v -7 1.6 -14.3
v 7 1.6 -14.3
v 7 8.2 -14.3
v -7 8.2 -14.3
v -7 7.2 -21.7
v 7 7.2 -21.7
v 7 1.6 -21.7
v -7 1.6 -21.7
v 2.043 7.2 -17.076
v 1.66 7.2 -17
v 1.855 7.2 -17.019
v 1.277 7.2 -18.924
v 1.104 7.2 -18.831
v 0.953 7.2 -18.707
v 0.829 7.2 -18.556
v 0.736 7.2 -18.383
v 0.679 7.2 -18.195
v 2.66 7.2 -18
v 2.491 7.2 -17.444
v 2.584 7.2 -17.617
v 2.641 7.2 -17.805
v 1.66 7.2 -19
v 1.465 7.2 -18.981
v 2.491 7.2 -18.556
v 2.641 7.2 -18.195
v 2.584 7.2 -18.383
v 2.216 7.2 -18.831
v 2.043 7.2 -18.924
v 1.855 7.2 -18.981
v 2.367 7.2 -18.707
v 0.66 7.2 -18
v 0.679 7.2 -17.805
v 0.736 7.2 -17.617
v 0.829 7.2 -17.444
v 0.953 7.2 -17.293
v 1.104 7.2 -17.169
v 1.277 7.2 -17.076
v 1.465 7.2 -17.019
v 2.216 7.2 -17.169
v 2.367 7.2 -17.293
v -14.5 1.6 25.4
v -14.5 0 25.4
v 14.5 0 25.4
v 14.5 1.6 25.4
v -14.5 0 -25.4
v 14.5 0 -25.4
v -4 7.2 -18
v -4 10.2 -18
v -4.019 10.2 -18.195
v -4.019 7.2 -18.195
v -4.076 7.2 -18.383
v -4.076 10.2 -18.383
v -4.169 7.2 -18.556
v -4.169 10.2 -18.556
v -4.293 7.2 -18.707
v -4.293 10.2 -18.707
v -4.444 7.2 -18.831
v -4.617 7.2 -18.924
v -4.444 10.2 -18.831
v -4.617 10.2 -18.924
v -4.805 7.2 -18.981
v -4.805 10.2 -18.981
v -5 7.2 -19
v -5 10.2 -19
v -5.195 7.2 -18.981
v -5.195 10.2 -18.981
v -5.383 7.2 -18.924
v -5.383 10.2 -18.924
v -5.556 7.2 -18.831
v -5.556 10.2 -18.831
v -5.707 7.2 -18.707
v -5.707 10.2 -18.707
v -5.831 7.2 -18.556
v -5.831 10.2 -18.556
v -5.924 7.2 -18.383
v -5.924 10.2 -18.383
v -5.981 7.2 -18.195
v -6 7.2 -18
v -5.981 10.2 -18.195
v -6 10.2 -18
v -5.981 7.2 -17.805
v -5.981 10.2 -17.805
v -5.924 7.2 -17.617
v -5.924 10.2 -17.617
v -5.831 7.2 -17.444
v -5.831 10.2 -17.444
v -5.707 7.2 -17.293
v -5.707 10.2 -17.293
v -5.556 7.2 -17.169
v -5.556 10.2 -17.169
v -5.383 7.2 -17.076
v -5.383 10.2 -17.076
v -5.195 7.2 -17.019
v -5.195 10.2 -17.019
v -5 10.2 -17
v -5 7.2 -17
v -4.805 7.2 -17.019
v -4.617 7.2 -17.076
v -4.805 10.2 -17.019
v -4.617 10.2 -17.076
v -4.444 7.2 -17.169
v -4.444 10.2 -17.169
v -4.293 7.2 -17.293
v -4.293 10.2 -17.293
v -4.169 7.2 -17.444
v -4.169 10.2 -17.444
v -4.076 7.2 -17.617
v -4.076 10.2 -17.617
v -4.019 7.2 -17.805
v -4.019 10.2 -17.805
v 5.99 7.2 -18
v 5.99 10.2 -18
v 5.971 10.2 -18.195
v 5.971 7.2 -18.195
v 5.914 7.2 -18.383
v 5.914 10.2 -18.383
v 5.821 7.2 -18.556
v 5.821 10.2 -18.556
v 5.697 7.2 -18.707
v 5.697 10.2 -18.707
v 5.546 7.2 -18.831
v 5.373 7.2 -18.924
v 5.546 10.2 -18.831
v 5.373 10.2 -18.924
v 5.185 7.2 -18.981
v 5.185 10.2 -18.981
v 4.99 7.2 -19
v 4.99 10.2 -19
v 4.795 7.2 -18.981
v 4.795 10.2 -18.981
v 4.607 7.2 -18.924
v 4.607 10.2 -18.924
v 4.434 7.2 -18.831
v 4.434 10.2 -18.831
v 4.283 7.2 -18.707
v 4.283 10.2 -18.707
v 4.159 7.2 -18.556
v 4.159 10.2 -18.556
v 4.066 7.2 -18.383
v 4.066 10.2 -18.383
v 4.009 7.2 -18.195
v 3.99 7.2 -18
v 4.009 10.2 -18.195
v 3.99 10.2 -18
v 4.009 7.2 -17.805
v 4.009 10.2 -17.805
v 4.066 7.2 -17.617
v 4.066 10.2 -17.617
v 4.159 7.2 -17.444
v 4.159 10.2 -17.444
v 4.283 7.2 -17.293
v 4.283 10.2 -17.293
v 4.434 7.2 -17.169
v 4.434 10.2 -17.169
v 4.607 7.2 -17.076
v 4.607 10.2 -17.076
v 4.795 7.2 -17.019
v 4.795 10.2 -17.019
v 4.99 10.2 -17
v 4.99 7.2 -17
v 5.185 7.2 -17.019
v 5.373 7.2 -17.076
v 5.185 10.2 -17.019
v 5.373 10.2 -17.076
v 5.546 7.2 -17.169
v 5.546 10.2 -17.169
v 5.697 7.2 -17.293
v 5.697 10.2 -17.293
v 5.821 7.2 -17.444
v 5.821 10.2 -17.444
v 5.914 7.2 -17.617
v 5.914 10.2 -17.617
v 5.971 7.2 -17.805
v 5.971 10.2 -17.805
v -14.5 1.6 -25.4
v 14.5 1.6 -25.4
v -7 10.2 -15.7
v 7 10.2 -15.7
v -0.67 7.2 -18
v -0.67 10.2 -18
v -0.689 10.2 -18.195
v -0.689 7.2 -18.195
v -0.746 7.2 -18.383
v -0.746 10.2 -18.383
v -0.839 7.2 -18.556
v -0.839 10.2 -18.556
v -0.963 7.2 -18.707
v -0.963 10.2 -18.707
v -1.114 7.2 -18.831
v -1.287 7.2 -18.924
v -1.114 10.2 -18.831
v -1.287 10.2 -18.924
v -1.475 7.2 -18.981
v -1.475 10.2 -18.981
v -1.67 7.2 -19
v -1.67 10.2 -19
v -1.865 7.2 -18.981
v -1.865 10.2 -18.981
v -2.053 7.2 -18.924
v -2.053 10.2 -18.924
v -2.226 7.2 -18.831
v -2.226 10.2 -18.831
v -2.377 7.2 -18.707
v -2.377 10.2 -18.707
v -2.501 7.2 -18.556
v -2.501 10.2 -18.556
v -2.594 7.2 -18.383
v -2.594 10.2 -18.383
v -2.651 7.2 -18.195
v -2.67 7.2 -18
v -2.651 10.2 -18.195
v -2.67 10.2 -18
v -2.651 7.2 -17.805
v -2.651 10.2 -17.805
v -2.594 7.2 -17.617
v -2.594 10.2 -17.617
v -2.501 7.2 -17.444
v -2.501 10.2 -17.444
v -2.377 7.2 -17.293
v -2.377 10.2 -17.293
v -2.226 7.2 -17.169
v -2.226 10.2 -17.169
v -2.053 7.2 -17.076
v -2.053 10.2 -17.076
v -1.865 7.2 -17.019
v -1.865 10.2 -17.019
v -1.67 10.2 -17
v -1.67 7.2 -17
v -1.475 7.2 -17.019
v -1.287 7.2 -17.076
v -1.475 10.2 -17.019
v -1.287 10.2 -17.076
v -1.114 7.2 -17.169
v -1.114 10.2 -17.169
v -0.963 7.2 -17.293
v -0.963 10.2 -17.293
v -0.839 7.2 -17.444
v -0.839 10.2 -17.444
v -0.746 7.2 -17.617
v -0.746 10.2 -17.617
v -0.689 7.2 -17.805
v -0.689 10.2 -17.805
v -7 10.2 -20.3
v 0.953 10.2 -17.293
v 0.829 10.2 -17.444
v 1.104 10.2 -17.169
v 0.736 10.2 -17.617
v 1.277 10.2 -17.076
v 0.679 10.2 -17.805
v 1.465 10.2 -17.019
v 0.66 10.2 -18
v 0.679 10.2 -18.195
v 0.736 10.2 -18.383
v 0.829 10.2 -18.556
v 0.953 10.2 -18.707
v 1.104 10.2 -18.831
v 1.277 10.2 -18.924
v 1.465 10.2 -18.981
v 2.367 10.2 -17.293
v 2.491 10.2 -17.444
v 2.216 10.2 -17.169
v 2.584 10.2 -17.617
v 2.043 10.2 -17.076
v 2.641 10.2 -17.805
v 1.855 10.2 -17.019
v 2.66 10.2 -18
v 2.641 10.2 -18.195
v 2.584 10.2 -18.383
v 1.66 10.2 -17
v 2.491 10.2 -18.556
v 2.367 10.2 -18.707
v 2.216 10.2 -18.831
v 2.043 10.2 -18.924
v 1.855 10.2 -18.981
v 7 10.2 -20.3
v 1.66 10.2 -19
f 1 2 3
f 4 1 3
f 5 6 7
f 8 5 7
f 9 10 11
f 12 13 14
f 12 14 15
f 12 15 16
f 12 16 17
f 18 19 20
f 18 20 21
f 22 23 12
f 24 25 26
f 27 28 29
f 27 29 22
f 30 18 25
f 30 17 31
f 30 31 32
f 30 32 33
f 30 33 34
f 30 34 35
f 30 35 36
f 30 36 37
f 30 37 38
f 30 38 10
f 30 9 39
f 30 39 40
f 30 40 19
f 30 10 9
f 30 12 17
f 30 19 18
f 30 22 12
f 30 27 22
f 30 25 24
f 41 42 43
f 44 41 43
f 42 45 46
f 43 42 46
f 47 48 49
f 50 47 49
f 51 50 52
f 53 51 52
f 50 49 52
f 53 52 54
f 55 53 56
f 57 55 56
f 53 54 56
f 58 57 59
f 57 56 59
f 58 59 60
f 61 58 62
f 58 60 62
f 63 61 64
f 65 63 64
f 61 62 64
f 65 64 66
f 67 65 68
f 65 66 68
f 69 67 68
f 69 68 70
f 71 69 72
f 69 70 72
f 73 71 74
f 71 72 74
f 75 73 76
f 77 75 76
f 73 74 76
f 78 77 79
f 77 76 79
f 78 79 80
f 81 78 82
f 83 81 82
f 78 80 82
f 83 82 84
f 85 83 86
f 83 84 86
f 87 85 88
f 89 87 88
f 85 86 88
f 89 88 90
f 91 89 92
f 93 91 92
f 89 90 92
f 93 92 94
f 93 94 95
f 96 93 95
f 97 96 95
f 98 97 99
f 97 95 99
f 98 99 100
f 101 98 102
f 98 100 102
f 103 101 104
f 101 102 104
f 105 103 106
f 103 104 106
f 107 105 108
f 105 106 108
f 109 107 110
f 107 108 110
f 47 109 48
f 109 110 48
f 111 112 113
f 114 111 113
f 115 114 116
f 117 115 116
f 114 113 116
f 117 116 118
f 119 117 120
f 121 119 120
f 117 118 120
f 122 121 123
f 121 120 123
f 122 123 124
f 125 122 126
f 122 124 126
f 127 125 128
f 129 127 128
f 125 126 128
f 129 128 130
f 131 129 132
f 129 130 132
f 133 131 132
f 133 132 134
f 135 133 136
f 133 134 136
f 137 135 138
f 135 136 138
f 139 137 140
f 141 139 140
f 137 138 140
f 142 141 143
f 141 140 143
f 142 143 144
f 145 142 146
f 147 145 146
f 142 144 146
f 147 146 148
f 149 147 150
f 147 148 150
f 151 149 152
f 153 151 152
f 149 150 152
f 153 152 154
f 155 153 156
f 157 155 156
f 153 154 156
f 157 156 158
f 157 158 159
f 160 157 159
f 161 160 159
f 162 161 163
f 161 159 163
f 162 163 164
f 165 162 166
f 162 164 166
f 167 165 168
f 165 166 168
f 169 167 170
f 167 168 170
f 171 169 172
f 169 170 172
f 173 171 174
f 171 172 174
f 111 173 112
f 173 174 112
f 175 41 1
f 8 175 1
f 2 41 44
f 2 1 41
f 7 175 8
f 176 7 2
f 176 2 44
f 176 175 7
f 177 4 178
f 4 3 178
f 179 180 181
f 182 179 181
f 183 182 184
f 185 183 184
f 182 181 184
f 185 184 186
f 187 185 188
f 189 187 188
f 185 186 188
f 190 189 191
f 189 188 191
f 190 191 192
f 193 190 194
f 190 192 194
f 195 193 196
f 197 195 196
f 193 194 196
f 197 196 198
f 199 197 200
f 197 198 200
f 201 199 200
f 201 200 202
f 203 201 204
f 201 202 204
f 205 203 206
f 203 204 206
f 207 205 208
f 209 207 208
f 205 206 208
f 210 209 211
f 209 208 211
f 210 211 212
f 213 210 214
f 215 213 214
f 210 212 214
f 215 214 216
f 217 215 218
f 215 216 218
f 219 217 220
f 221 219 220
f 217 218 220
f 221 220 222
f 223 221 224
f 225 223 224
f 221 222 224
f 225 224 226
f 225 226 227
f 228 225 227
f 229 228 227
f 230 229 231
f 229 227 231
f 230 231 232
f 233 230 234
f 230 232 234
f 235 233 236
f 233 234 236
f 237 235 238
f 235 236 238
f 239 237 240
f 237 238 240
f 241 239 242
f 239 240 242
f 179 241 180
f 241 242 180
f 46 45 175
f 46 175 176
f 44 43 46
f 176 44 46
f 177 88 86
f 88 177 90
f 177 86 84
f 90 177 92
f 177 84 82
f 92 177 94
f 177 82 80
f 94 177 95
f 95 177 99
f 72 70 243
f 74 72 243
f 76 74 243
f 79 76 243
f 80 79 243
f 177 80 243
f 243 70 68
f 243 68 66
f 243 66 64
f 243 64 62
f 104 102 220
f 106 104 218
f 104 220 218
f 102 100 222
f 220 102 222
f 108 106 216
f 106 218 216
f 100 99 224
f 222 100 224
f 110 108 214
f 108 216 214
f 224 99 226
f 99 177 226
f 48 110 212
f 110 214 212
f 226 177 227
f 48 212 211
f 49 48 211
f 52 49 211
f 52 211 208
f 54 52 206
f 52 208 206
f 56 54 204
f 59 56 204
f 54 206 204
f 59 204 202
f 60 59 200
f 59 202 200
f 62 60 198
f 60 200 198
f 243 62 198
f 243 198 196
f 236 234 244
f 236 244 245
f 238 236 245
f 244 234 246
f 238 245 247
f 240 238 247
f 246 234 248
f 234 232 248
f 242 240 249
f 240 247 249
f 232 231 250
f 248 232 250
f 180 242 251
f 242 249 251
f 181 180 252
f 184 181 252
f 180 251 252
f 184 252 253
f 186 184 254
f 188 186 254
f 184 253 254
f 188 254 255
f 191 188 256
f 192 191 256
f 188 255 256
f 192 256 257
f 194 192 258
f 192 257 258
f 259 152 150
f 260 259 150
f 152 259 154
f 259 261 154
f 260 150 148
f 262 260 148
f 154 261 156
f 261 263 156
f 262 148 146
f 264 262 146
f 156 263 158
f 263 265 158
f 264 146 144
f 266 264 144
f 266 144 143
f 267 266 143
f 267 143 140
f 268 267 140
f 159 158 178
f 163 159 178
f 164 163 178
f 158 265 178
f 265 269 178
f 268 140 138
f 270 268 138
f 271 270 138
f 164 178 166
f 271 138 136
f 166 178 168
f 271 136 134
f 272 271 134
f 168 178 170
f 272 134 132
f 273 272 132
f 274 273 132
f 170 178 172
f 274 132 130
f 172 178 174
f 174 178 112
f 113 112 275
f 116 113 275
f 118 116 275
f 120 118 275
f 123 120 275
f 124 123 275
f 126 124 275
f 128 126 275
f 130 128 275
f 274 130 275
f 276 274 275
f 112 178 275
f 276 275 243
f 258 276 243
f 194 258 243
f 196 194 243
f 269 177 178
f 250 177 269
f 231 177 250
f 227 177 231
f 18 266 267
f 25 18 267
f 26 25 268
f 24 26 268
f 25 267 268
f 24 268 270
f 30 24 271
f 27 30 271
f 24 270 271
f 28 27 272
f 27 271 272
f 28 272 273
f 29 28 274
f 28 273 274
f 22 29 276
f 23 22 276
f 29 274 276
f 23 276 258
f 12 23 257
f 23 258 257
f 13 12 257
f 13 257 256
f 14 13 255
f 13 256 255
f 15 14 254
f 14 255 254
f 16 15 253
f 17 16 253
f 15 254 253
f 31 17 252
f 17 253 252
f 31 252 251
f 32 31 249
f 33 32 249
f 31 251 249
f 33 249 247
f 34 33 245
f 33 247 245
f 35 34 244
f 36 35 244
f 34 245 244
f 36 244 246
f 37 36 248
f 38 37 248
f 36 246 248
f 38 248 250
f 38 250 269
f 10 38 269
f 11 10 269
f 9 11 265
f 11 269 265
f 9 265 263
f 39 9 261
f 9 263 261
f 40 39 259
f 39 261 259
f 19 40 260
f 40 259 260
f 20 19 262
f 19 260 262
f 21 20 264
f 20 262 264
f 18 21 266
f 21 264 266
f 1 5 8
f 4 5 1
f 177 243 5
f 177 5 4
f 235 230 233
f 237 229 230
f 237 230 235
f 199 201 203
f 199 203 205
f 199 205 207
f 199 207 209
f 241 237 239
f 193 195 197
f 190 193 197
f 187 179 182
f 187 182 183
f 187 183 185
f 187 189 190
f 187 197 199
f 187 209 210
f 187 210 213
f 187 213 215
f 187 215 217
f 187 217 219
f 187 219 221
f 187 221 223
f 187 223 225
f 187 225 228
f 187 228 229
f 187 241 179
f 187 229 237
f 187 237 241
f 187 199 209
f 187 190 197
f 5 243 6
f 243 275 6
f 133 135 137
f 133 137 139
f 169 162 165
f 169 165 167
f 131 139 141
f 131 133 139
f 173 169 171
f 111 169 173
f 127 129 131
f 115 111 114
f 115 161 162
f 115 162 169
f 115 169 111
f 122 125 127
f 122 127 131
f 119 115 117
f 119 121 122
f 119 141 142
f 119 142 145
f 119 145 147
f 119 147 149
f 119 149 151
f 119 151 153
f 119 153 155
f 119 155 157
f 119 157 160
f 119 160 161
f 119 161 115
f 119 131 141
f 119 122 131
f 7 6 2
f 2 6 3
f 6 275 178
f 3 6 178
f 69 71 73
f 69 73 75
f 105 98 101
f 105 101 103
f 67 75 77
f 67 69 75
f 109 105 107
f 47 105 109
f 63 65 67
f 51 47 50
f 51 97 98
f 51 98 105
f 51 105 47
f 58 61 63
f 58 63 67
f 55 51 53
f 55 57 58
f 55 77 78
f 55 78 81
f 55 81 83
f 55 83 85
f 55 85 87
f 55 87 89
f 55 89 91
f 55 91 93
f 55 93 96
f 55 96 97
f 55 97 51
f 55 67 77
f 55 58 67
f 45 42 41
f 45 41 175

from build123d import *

# Parameters (mm, degrees)
CROQUIS1_W              = 29
CROQUIS1_H              = 50.8
SALIENTE_EXTRUIR1_DEPTH = 1.6
SALIENTE_EXTRUIR2_DEPTH = 7
CROQUIS3_R              = 1
CORTAR_EXTRUIR1_DEPTH   = 3


with BuildPart() as part:
    # Croquis1 → Saliente-Extruir1 (new body)
    with BuildSketch(Plane(origin=(0, 0, 0), x_dir=(1, 0, 0), z_dir=(0, 1, 0))):
        Rectangle(CROQUIS1_W, CROQUIS1_H)
    extrude(amount=SALIENTE_EXTRUIR1_DEPTH)

    # Croquis2 → Saliente-Extruir2 (add, symmetric)
    with BuildSketch(Plane(origin=(0, 0, 0), x_dir=(0, 0, -1), z_dir=(1, 0, 0))):
        Polygon((14.3, 1.6), (14.3, 8.2), (15.7, 10.2), (20.3, 10.2), (21.7, 7.2), (21.7, 1.6), align=None)
    extrude(amount=SALIENTE_EXTRUIR2_DEPTH, both=True)

    # Croquis3 → Cortar-Extruir1 (cut)
    with BuildSketch(Plane(origin=(0, 10.2, 0), x_dir=(1, 0, 0), z_dir=(0, 1, 0))):
        with Locations((-5, 18)):
            Circle(CROQUIS3_R)
        with Locations((-1.67, 18)):
            Circle(CROQUIS3_R)
        with Locations((1.66, 18)):
            Circle(CROQUIS3_R)
        with Locations((4.99, 18)):
            Circle(CROQUIS3_R)
    extrude(amount=-CORTAR_EXTRUIR1_DEPTH, mode=Mode.SUBTRACT)


solid = part.part
